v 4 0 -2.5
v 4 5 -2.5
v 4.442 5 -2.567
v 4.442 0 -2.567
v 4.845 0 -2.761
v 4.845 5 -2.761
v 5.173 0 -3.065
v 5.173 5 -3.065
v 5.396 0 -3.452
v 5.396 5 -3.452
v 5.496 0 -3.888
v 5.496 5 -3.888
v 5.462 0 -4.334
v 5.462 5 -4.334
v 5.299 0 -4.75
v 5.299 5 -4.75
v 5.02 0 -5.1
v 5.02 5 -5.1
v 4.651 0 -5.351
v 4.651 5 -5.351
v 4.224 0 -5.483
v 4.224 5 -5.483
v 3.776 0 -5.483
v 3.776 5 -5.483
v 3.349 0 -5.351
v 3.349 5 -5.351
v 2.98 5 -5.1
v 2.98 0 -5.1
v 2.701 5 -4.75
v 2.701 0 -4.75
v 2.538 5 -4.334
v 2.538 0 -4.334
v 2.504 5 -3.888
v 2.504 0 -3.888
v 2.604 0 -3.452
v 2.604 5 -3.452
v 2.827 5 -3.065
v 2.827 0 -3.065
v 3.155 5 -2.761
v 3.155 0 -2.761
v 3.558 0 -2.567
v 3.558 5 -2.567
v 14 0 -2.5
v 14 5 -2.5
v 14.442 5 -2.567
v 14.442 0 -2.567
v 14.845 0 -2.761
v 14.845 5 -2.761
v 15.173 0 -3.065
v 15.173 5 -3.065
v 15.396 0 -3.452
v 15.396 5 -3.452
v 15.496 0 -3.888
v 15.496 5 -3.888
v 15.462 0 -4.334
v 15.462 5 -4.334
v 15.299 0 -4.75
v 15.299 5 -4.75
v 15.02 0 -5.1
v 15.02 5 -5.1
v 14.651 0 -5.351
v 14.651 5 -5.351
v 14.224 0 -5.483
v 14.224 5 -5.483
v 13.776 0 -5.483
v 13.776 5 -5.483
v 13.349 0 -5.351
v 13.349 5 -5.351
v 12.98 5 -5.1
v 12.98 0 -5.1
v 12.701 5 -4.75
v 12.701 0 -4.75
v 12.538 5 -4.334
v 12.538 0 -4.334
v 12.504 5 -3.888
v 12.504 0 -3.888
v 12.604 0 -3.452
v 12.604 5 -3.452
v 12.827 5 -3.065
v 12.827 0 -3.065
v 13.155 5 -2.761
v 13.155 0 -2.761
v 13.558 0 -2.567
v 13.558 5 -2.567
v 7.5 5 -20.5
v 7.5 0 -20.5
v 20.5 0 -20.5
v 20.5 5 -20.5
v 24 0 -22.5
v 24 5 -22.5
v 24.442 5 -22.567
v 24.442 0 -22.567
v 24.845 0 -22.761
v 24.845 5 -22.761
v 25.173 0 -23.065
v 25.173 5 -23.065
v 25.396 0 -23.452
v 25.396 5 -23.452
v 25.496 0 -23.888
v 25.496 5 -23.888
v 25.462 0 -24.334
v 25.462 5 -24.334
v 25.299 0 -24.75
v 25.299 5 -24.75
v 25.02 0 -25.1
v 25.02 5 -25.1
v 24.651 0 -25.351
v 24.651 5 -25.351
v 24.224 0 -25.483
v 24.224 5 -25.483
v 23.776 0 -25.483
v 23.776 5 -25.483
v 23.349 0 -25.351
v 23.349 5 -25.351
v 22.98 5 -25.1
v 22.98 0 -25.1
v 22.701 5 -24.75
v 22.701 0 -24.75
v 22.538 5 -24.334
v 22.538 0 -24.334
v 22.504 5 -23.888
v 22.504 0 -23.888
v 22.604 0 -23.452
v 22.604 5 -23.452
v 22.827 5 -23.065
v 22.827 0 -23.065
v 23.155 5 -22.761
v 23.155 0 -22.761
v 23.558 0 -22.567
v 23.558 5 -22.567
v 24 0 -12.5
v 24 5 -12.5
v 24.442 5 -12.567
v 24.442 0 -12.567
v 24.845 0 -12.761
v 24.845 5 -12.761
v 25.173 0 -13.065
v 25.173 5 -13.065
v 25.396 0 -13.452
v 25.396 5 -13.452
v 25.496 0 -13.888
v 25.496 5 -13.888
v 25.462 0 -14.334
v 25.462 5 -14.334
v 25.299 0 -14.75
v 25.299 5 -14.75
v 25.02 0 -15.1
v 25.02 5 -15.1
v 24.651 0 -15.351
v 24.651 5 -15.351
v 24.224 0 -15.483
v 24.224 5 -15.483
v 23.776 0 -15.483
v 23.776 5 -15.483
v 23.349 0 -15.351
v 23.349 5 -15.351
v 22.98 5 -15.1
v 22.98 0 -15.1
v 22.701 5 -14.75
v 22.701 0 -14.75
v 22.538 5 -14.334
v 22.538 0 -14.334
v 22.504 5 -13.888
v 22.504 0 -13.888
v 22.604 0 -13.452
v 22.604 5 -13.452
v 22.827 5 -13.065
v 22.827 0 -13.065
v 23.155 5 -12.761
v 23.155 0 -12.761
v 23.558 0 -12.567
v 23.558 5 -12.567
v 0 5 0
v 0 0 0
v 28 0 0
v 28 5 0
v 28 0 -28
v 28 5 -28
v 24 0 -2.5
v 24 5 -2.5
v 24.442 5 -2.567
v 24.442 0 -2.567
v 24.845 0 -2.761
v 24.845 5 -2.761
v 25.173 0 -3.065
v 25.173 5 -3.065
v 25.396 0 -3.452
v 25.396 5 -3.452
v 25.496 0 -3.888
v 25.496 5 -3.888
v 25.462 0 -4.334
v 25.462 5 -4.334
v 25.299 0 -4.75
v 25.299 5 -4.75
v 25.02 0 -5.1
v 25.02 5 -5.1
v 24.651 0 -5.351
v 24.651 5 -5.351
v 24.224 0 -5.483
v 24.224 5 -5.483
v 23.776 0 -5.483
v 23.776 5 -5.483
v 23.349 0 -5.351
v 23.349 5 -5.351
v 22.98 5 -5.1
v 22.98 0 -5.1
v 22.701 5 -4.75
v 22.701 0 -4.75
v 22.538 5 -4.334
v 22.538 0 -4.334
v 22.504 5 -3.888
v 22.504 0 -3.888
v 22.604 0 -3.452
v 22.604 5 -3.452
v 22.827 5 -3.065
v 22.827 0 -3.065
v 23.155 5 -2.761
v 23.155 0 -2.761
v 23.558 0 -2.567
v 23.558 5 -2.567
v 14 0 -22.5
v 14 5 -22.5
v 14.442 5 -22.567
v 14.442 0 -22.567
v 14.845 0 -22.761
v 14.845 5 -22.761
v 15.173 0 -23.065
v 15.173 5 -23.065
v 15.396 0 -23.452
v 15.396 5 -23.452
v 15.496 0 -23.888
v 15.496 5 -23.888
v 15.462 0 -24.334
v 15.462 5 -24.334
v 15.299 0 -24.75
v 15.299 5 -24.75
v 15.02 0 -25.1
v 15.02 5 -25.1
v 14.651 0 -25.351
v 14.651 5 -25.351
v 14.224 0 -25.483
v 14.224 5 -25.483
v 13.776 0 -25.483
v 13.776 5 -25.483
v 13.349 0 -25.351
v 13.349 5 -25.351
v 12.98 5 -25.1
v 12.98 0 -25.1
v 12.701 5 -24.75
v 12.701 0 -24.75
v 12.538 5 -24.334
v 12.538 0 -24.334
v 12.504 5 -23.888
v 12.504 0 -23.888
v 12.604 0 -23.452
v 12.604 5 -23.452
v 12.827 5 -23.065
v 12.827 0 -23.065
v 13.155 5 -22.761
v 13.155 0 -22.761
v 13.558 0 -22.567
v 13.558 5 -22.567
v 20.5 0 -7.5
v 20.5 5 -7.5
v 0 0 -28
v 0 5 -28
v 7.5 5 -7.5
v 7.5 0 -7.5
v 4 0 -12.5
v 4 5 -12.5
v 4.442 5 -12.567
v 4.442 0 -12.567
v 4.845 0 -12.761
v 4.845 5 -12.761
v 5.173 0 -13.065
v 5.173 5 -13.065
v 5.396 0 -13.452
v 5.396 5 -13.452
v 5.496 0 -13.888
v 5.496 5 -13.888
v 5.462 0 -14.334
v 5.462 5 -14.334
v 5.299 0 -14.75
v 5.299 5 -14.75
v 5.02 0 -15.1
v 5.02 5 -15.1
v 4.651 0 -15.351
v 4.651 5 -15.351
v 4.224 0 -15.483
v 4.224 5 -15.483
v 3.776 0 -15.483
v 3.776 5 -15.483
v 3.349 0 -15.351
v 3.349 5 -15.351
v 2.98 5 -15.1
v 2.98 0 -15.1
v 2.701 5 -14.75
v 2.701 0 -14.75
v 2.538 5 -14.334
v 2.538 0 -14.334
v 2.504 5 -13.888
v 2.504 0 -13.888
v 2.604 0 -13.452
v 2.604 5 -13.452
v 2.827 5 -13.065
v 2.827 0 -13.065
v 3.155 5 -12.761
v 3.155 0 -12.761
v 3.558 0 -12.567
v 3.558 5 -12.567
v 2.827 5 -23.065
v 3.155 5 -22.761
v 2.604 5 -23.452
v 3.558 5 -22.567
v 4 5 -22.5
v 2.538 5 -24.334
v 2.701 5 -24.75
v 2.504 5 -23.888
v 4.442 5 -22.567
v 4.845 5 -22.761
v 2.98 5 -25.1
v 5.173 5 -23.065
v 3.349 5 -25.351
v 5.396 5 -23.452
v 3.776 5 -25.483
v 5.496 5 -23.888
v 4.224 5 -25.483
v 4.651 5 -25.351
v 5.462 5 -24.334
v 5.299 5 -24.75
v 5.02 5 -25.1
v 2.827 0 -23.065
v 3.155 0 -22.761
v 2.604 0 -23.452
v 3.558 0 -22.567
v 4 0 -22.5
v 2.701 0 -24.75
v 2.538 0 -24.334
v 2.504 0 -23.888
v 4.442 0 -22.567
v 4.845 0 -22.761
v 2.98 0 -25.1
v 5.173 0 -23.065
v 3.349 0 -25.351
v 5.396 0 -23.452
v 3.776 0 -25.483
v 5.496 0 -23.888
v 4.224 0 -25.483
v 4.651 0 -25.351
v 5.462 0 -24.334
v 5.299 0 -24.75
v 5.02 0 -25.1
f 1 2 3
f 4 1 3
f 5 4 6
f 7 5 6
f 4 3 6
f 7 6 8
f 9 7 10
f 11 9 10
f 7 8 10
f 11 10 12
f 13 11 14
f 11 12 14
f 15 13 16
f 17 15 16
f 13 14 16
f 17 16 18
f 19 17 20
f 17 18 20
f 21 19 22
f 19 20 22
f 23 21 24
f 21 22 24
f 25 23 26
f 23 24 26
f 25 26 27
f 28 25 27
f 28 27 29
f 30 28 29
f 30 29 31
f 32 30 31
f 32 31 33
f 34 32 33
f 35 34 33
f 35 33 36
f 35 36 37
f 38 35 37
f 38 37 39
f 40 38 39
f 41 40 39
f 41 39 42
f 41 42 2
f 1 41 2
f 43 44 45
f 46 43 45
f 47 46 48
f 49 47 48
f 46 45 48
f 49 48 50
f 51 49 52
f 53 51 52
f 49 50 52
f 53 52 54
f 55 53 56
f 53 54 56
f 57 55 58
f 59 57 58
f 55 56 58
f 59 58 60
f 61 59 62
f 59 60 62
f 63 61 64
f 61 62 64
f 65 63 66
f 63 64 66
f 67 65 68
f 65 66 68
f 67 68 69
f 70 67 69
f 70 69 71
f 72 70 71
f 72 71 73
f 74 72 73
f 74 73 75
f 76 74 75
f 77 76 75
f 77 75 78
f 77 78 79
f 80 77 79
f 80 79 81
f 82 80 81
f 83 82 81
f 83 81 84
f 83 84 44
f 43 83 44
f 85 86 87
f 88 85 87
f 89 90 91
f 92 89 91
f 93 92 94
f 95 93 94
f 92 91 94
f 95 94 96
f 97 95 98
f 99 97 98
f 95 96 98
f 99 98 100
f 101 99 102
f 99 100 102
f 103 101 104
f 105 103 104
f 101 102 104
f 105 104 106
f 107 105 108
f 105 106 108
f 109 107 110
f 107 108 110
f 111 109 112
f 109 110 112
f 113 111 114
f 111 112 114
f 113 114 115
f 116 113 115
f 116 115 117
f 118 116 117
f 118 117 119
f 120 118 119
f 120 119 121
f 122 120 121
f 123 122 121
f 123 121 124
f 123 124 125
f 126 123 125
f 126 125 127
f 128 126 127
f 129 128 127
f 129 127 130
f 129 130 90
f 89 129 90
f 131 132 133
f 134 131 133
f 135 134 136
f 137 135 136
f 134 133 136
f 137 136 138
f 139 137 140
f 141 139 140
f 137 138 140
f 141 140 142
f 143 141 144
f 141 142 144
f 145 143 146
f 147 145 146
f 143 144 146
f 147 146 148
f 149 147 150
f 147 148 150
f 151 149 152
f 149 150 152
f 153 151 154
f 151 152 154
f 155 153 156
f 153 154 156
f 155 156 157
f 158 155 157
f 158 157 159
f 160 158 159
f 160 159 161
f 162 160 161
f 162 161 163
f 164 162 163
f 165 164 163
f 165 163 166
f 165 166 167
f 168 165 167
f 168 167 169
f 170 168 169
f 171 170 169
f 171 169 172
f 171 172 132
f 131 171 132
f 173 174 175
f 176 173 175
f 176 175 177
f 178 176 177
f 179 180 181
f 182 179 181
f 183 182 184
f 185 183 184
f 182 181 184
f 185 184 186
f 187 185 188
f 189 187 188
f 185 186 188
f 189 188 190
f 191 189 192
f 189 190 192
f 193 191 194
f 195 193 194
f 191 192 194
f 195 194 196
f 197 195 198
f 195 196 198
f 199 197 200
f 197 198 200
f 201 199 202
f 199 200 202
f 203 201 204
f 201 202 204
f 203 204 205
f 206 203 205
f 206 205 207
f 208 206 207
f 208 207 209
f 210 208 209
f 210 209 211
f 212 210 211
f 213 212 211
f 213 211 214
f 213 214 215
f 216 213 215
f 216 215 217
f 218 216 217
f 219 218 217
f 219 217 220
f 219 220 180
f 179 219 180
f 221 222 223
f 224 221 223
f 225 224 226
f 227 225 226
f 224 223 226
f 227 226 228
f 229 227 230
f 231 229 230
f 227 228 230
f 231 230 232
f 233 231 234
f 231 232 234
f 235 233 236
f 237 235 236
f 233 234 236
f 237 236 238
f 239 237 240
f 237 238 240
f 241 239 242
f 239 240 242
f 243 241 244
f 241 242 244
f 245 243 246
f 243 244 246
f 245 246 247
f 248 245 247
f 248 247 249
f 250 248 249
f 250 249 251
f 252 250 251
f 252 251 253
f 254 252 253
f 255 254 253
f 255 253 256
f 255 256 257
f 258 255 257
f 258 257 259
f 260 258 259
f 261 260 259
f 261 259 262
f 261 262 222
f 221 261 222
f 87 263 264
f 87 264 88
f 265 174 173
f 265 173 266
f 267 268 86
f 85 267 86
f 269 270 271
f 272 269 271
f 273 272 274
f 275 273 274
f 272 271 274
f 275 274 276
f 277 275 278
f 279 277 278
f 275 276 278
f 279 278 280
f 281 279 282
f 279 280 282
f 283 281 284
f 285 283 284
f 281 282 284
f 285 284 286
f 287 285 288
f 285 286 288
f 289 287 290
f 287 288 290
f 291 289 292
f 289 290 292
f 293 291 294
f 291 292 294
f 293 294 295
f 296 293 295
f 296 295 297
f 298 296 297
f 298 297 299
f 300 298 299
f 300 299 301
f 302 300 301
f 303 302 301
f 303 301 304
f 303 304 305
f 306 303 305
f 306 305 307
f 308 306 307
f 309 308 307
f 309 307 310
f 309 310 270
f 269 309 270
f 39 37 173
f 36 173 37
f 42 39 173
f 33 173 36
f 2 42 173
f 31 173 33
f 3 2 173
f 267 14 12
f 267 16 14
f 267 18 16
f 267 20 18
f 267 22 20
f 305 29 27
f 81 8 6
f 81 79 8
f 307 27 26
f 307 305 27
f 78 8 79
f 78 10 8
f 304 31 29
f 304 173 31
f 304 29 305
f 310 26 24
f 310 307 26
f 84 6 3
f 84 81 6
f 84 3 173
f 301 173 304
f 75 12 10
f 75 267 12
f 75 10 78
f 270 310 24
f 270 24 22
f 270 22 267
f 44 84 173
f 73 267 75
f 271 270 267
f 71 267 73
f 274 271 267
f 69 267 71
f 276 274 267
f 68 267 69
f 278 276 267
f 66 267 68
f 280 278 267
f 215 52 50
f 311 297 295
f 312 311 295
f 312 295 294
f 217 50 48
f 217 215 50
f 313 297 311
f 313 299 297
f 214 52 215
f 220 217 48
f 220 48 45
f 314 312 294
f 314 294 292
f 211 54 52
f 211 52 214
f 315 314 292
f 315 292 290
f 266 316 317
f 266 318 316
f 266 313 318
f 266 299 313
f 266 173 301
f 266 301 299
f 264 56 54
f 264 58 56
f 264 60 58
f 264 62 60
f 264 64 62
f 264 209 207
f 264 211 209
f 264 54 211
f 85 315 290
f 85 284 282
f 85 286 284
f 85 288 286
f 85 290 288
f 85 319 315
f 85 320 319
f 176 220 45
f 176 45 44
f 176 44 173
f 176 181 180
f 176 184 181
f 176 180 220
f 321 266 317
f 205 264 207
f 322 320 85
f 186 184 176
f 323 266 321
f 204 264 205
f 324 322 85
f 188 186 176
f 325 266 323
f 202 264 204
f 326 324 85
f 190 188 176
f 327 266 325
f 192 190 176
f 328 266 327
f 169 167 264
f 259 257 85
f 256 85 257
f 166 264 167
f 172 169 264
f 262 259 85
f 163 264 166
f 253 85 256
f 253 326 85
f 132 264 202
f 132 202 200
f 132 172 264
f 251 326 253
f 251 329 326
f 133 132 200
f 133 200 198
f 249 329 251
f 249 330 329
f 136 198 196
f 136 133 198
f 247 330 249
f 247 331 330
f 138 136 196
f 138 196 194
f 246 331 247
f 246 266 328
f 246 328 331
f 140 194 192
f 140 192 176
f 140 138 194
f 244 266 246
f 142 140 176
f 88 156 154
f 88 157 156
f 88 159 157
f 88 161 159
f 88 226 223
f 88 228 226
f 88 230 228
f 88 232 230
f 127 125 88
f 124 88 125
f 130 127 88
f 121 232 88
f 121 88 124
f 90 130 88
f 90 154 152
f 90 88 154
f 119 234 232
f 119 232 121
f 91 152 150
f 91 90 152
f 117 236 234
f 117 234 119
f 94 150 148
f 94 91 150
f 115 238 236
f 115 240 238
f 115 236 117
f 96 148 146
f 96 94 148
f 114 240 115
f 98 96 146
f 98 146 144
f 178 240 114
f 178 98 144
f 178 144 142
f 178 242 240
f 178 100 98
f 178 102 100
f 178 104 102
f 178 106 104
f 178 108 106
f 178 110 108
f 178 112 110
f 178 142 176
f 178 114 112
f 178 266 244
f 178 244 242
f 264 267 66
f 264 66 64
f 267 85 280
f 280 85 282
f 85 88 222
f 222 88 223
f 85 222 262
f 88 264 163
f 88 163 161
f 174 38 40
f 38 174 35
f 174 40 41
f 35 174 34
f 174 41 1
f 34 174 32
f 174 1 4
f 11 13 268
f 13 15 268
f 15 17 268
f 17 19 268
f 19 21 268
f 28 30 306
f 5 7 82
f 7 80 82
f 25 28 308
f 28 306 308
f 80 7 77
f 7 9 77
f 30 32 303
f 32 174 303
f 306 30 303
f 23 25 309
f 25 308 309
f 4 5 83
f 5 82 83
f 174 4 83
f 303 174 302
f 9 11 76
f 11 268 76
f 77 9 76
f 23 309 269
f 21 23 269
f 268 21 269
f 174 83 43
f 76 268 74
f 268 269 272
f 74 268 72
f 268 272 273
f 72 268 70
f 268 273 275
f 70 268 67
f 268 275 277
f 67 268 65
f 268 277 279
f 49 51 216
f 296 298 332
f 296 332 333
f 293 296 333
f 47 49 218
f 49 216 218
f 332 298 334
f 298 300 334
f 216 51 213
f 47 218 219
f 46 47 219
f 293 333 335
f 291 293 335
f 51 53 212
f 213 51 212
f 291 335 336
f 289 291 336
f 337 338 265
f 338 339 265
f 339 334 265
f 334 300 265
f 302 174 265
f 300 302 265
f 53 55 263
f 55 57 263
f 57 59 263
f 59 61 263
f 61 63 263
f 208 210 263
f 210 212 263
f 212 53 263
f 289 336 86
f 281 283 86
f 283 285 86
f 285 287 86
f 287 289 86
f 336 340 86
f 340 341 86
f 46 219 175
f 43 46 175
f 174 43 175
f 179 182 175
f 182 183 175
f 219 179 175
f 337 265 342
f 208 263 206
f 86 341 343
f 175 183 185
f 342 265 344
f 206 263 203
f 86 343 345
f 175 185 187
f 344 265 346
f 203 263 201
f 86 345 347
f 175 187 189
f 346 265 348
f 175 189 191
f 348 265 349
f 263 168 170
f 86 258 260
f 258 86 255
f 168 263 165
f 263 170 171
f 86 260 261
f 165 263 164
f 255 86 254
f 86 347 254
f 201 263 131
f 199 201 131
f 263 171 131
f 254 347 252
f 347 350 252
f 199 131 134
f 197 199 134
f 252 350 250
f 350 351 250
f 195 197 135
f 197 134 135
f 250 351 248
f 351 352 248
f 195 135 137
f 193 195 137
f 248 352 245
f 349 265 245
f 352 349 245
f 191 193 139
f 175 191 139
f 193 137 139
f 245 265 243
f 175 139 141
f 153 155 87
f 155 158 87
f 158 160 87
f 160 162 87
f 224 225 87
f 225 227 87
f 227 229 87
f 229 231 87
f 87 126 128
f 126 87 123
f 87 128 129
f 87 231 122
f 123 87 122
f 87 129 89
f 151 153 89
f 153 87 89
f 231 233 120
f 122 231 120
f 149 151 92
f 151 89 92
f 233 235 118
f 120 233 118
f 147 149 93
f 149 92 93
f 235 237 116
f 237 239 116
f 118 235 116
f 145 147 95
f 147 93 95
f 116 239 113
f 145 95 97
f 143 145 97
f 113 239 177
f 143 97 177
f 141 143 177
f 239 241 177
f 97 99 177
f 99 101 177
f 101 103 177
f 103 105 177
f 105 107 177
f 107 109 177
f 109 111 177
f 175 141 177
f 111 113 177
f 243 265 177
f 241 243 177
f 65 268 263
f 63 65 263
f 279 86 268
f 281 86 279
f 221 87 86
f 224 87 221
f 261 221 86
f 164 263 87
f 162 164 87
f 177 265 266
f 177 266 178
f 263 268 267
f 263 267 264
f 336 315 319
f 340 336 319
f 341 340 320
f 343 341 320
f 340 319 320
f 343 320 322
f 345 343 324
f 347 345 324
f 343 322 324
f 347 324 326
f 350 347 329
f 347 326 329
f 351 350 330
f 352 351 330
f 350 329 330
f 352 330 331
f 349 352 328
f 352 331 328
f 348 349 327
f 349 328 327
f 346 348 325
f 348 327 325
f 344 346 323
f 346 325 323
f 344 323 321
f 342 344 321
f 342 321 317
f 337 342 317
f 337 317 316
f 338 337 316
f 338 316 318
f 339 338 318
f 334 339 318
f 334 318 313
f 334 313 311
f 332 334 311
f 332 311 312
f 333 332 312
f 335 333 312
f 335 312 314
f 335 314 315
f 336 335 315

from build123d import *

# Parameters (mm, degrees)
SKETCH_1_W          = 28
SKETCH_1_H          = 28
SKETCH_1_W_2        = 13
SKETCH_1_H_2        = 13
EXTRUDE_1_DEPTH     = 5
SKETCH_3_R          = 1.5
CUT_EXTRUDE_1_DEPTH = 40.912404087
SKETCH_6_R          = 1.5
CUT_EXTRUDE_2_DEPTH = 40.912404087


with BuildPart() as part:
    # Эскиз1 → Бобышка-Вытянуть1 (new body)
    with BuildSketch(Plane(origin=(0, 0, 0), x_dir=(1, 0, 0), z_dir=(0, 1, 0))):
        with Locations((14, 14)):
            Rectangle(SKETCH_1_W, SKETCH_1_H)
        with Locations((14, 14)):
            Rectangle(SKETCH_1_W_2, SKETCH_1_H_2, mode=Mode.SUBTRACT)
    extrude(amount=EXTRUDE_1_DEPTH)

    # Эскиз3 → Вырез-Вытянуть1 (cut, through all)
    with BuildSketch(Plane(origin=(0, 5, 0), x_dir=(1, 0, 0), z_dir=(0, 1, 0))):
        with Locations(Location((24, 24, 0), (0, 0, 270))):
            Circle(SKETCH_3_R)
    extrude(amount=-CUT_EXTRUDE_1_DEPTH, mode=Mode.SUBTRACT)

    # Эскиз6 → Вырез-Вытянуть2 (cut, through all)
    with BuildSketch(Plane(origin=(0, 5, 0), x_dir=(1, 0, 0), z_dir=(0, 1, 0))):
        with Locations(Location((4, 24, 0), (0, 0, 270))):
            Circle(SKETCH_6_R)
        with Locations(Location((4, 4, 0), (0, 0, 270))):
            Circle(SKETCH_6_R)
        with Locations(Location((24, 4, 0), (0, 0, 270))):
            Circle(SKETCH_6_R)
        with Locations(Location((24, 14, 0), (0, 0, 270))):
            Circle(SKETCH_6_R)
        with Locations(Location((14, 24, 0), (0, 0, 270))):
            Circle(SKETCH_6_R)
        with Locations(Location((4, 14, 0), (0, 0, 270))):
            Circle(SKETCH_6_R)
        with Locations(Location((14, 4, 0), (0, 0, 270))):
            Circle(SKETCH_6_R)
    extrude(amount=-CUT_EXTRUDE_2_DEPTH, mode=Mode.SUBTRACT)


solid = part.part
